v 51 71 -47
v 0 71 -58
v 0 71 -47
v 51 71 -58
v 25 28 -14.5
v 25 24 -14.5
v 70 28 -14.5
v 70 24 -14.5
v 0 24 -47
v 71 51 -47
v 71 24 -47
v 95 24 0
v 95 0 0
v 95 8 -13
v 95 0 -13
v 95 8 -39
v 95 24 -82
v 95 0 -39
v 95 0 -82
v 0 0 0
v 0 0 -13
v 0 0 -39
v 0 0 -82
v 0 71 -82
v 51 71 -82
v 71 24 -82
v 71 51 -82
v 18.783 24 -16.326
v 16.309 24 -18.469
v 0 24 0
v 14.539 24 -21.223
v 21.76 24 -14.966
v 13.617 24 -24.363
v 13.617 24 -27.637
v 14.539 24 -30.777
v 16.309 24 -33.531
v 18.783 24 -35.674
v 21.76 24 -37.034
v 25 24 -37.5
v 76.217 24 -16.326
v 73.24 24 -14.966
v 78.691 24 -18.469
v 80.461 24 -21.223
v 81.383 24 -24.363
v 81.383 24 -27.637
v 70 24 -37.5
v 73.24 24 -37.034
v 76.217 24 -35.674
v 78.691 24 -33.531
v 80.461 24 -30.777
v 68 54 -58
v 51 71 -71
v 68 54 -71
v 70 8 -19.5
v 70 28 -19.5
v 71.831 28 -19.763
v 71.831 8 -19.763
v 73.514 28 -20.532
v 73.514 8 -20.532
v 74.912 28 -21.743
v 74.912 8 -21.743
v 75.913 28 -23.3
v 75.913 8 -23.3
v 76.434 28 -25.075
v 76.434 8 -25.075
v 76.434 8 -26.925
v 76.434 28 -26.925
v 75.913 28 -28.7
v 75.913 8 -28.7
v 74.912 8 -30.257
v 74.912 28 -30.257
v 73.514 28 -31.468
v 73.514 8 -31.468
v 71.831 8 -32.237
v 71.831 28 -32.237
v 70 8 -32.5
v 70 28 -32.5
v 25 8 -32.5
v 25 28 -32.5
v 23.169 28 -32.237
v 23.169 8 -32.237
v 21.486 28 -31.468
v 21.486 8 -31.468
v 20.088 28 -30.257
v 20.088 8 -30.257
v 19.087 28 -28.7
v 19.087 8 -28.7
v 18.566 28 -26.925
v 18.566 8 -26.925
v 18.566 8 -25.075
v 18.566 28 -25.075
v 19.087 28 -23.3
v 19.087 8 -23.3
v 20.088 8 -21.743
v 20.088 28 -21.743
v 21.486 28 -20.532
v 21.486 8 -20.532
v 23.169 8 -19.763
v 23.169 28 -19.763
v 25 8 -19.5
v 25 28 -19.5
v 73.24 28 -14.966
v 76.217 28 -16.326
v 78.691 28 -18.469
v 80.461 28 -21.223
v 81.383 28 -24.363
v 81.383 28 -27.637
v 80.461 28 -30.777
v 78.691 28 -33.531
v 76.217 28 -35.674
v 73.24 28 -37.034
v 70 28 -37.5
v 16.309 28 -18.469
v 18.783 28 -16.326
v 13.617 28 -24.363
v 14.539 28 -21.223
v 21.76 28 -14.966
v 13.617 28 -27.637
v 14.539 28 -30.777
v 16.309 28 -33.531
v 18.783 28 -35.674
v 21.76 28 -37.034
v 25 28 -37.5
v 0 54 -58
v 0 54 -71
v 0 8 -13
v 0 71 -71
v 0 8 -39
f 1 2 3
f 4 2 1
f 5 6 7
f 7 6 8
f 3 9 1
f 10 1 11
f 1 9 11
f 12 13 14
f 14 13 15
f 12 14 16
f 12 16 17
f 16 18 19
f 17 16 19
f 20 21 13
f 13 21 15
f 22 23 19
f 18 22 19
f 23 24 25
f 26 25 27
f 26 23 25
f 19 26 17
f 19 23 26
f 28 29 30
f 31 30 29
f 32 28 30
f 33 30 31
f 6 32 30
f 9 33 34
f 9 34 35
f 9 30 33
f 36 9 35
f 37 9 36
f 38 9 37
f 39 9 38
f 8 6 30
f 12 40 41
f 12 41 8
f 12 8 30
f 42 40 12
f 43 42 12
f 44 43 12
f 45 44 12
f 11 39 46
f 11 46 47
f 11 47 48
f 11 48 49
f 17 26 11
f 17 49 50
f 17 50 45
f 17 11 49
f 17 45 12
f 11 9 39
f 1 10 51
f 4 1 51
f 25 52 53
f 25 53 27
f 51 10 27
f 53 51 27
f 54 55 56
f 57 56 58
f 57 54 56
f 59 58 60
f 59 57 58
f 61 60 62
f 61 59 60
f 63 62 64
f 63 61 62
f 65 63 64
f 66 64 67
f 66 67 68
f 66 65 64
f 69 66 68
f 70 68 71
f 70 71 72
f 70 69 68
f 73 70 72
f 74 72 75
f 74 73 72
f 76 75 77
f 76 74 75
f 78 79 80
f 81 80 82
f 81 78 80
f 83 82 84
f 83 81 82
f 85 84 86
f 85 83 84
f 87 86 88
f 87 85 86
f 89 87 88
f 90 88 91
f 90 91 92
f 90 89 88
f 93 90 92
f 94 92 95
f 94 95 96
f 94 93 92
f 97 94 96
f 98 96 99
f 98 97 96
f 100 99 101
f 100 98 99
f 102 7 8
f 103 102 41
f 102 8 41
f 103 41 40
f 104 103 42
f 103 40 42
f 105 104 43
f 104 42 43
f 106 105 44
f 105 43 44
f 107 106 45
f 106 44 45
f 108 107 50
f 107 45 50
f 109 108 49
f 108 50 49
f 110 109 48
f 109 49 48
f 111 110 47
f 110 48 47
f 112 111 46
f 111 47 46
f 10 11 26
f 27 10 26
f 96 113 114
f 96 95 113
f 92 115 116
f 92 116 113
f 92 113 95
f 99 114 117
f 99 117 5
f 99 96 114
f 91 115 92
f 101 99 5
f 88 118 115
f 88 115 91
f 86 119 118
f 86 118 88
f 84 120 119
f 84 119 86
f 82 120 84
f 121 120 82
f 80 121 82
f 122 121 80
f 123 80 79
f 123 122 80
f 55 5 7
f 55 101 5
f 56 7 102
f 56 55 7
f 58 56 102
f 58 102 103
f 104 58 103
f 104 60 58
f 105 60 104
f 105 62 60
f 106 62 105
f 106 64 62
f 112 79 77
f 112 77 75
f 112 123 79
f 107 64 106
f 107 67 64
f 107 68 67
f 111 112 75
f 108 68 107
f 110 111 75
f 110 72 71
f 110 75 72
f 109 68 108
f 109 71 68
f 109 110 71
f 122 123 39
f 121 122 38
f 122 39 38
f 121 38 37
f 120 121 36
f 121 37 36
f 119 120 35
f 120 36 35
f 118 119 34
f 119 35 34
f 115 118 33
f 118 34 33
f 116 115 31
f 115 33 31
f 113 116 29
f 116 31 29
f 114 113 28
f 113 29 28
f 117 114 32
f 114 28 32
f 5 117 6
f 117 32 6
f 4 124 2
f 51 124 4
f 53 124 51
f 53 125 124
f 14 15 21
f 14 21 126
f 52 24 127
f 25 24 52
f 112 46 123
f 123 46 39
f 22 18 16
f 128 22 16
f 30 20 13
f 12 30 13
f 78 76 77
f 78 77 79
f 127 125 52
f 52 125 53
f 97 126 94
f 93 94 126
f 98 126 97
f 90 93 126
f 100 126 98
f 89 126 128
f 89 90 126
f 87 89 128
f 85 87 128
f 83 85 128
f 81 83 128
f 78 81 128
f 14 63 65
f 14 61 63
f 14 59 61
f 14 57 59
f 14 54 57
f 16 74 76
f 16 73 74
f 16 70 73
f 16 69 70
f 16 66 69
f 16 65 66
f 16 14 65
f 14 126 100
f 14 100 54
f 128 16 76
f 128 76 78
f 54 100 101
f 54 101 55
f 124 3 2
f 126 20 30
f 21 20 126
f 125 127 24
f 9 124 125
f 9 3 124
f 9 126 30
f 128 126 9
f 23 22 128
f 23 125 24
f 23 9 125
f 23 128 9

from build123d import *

# Parameters (mm, degrees)
BOSS_EXTRUDE1_DEPTH = 24
BOSS_EXTRUDE2_DEPTH = 28
SKETCH1_4_W         = 71
SKETCH1_4_H         = 11
BOSS_EXTRUDE3_DEPTH = 71
SKETCH1_5_W         = 71
SKETCH1_5_H         = 13
BOSS_EXTRUDE4_DEPTH = 54
SKETCH2_W           = 26
SKETCH2_H           = 8
CUT_EXTRUDE1_DEPTH  = 96
CHAMFER1_SIZE       = 20


with BuildPart() as part:
    # Sketch1 → Boss-Extrude1 (new body)
    with BuildSketch(Plane(origin=(0, 0, 0), x_dir=(1, 0, 0), z_dir=(0, 1, 0))):
        Polygon((0, 47), (0, 0), (95, 0), (95, 82), (71, 82), (71, 71), (71, 58), (71, 47), align=None)
        with BuildLine():
            ThreePointArc((25, 14.5), (13.5, 26), (25, 37.5))
            Line((25, 37.5), (70, 37.5))
            ThreePointArc((70, 37.5), (81.5, 26), (70, 14.5))
            Line((70, 14.5), (25, 14.5))
        make_face(mode=Mode.SUBTRACT)
    extrude(amount=BOSS_EXTRUDE1_DEPTH)

    # Sketch1<3> → Boss-Extrude2 (add)
    with BuildSketch(Plane(origin=(0, 0, 0), x_dir=(1, 0, 0), z_dir=(0, 1, 0))):
        with BuildLine():
            Line((70, 37.5), (25, 37.5))
            ThreePointArc((25, 37.5), (13.5, 26), (25, 14.5))
            Line((25, 14.5), (70, 14.5))
            ThreePointArc((70, 14.5), (81.5, 26), (70, 37.5))
        make_face()
        with BuildLine():
            ThreePointArc((25, 19.5), (18.5, 26), (25, 32.5))
            Line((25, 32.5), (70, 32.5))
            ThreePointArc((70, 32.5), (76.5, 26), (70, 19.5))
            Line((70, 19.5), (25, 19.5))
        make_face(mode=Mode.SUBTRACT)
    extrude(amount=BOSS_EXTRUDE2_DEPTH)

    # Sketch1<4> → Boss-Extrude3 (add)
    with BuildSketch(Plane(origin=(0, 0, 0), x_dir=(1, 0, 0), z_dir=(0, 1, 0))):
        with Locations((35.5, 52.5)):
            Rectangle(SKETCH1_4_W, SKETCH1_4_H)
        with Locations((35.5, 76.5)):
            Rectangle(SKETCH1_4_W, SKETCH1_4_H)
    extrude(amount=BOSS_EXTRUDE3_DEPTH)

    # Sketch1<5> → Boss-Extrude4 (add)
    with BuildSketch(Plane(origin=(0, 0, 0), x_dir=(1, 0, 0), z_dir=(0, 1, 0))):
        with Locations((35.5, 64.5)):
            Rectangle(SKETCH1_5_W, SKETCH1_5_H)
    extrude(amount=BOSS_EXTRUDE4_DEPTH)

    # Sketch2 → Cut-Extrude1 (cut)
    with BuildSketch(Plane(origin=(95, 0, 0), x_dir=(0, 0, -1), z_dir=(1, 0, 0))):
        with Locations((26, 4)):
            Rectangle(SKETCH2_W, SKETCH2_H)
    extrude(amount=-CUT_EXTRUDE1_DEPTH, mode=Mode.SUBTRACT)

    # Chamfer1
    chamfer1_edges = [part.edges().sort_by_distance(p)[0] for p in [
        (71, 71, -76.5),
    ]]
    chamfer(chamfer1_edges, length=CHAMFER1_SIZE)


solid = part.part
